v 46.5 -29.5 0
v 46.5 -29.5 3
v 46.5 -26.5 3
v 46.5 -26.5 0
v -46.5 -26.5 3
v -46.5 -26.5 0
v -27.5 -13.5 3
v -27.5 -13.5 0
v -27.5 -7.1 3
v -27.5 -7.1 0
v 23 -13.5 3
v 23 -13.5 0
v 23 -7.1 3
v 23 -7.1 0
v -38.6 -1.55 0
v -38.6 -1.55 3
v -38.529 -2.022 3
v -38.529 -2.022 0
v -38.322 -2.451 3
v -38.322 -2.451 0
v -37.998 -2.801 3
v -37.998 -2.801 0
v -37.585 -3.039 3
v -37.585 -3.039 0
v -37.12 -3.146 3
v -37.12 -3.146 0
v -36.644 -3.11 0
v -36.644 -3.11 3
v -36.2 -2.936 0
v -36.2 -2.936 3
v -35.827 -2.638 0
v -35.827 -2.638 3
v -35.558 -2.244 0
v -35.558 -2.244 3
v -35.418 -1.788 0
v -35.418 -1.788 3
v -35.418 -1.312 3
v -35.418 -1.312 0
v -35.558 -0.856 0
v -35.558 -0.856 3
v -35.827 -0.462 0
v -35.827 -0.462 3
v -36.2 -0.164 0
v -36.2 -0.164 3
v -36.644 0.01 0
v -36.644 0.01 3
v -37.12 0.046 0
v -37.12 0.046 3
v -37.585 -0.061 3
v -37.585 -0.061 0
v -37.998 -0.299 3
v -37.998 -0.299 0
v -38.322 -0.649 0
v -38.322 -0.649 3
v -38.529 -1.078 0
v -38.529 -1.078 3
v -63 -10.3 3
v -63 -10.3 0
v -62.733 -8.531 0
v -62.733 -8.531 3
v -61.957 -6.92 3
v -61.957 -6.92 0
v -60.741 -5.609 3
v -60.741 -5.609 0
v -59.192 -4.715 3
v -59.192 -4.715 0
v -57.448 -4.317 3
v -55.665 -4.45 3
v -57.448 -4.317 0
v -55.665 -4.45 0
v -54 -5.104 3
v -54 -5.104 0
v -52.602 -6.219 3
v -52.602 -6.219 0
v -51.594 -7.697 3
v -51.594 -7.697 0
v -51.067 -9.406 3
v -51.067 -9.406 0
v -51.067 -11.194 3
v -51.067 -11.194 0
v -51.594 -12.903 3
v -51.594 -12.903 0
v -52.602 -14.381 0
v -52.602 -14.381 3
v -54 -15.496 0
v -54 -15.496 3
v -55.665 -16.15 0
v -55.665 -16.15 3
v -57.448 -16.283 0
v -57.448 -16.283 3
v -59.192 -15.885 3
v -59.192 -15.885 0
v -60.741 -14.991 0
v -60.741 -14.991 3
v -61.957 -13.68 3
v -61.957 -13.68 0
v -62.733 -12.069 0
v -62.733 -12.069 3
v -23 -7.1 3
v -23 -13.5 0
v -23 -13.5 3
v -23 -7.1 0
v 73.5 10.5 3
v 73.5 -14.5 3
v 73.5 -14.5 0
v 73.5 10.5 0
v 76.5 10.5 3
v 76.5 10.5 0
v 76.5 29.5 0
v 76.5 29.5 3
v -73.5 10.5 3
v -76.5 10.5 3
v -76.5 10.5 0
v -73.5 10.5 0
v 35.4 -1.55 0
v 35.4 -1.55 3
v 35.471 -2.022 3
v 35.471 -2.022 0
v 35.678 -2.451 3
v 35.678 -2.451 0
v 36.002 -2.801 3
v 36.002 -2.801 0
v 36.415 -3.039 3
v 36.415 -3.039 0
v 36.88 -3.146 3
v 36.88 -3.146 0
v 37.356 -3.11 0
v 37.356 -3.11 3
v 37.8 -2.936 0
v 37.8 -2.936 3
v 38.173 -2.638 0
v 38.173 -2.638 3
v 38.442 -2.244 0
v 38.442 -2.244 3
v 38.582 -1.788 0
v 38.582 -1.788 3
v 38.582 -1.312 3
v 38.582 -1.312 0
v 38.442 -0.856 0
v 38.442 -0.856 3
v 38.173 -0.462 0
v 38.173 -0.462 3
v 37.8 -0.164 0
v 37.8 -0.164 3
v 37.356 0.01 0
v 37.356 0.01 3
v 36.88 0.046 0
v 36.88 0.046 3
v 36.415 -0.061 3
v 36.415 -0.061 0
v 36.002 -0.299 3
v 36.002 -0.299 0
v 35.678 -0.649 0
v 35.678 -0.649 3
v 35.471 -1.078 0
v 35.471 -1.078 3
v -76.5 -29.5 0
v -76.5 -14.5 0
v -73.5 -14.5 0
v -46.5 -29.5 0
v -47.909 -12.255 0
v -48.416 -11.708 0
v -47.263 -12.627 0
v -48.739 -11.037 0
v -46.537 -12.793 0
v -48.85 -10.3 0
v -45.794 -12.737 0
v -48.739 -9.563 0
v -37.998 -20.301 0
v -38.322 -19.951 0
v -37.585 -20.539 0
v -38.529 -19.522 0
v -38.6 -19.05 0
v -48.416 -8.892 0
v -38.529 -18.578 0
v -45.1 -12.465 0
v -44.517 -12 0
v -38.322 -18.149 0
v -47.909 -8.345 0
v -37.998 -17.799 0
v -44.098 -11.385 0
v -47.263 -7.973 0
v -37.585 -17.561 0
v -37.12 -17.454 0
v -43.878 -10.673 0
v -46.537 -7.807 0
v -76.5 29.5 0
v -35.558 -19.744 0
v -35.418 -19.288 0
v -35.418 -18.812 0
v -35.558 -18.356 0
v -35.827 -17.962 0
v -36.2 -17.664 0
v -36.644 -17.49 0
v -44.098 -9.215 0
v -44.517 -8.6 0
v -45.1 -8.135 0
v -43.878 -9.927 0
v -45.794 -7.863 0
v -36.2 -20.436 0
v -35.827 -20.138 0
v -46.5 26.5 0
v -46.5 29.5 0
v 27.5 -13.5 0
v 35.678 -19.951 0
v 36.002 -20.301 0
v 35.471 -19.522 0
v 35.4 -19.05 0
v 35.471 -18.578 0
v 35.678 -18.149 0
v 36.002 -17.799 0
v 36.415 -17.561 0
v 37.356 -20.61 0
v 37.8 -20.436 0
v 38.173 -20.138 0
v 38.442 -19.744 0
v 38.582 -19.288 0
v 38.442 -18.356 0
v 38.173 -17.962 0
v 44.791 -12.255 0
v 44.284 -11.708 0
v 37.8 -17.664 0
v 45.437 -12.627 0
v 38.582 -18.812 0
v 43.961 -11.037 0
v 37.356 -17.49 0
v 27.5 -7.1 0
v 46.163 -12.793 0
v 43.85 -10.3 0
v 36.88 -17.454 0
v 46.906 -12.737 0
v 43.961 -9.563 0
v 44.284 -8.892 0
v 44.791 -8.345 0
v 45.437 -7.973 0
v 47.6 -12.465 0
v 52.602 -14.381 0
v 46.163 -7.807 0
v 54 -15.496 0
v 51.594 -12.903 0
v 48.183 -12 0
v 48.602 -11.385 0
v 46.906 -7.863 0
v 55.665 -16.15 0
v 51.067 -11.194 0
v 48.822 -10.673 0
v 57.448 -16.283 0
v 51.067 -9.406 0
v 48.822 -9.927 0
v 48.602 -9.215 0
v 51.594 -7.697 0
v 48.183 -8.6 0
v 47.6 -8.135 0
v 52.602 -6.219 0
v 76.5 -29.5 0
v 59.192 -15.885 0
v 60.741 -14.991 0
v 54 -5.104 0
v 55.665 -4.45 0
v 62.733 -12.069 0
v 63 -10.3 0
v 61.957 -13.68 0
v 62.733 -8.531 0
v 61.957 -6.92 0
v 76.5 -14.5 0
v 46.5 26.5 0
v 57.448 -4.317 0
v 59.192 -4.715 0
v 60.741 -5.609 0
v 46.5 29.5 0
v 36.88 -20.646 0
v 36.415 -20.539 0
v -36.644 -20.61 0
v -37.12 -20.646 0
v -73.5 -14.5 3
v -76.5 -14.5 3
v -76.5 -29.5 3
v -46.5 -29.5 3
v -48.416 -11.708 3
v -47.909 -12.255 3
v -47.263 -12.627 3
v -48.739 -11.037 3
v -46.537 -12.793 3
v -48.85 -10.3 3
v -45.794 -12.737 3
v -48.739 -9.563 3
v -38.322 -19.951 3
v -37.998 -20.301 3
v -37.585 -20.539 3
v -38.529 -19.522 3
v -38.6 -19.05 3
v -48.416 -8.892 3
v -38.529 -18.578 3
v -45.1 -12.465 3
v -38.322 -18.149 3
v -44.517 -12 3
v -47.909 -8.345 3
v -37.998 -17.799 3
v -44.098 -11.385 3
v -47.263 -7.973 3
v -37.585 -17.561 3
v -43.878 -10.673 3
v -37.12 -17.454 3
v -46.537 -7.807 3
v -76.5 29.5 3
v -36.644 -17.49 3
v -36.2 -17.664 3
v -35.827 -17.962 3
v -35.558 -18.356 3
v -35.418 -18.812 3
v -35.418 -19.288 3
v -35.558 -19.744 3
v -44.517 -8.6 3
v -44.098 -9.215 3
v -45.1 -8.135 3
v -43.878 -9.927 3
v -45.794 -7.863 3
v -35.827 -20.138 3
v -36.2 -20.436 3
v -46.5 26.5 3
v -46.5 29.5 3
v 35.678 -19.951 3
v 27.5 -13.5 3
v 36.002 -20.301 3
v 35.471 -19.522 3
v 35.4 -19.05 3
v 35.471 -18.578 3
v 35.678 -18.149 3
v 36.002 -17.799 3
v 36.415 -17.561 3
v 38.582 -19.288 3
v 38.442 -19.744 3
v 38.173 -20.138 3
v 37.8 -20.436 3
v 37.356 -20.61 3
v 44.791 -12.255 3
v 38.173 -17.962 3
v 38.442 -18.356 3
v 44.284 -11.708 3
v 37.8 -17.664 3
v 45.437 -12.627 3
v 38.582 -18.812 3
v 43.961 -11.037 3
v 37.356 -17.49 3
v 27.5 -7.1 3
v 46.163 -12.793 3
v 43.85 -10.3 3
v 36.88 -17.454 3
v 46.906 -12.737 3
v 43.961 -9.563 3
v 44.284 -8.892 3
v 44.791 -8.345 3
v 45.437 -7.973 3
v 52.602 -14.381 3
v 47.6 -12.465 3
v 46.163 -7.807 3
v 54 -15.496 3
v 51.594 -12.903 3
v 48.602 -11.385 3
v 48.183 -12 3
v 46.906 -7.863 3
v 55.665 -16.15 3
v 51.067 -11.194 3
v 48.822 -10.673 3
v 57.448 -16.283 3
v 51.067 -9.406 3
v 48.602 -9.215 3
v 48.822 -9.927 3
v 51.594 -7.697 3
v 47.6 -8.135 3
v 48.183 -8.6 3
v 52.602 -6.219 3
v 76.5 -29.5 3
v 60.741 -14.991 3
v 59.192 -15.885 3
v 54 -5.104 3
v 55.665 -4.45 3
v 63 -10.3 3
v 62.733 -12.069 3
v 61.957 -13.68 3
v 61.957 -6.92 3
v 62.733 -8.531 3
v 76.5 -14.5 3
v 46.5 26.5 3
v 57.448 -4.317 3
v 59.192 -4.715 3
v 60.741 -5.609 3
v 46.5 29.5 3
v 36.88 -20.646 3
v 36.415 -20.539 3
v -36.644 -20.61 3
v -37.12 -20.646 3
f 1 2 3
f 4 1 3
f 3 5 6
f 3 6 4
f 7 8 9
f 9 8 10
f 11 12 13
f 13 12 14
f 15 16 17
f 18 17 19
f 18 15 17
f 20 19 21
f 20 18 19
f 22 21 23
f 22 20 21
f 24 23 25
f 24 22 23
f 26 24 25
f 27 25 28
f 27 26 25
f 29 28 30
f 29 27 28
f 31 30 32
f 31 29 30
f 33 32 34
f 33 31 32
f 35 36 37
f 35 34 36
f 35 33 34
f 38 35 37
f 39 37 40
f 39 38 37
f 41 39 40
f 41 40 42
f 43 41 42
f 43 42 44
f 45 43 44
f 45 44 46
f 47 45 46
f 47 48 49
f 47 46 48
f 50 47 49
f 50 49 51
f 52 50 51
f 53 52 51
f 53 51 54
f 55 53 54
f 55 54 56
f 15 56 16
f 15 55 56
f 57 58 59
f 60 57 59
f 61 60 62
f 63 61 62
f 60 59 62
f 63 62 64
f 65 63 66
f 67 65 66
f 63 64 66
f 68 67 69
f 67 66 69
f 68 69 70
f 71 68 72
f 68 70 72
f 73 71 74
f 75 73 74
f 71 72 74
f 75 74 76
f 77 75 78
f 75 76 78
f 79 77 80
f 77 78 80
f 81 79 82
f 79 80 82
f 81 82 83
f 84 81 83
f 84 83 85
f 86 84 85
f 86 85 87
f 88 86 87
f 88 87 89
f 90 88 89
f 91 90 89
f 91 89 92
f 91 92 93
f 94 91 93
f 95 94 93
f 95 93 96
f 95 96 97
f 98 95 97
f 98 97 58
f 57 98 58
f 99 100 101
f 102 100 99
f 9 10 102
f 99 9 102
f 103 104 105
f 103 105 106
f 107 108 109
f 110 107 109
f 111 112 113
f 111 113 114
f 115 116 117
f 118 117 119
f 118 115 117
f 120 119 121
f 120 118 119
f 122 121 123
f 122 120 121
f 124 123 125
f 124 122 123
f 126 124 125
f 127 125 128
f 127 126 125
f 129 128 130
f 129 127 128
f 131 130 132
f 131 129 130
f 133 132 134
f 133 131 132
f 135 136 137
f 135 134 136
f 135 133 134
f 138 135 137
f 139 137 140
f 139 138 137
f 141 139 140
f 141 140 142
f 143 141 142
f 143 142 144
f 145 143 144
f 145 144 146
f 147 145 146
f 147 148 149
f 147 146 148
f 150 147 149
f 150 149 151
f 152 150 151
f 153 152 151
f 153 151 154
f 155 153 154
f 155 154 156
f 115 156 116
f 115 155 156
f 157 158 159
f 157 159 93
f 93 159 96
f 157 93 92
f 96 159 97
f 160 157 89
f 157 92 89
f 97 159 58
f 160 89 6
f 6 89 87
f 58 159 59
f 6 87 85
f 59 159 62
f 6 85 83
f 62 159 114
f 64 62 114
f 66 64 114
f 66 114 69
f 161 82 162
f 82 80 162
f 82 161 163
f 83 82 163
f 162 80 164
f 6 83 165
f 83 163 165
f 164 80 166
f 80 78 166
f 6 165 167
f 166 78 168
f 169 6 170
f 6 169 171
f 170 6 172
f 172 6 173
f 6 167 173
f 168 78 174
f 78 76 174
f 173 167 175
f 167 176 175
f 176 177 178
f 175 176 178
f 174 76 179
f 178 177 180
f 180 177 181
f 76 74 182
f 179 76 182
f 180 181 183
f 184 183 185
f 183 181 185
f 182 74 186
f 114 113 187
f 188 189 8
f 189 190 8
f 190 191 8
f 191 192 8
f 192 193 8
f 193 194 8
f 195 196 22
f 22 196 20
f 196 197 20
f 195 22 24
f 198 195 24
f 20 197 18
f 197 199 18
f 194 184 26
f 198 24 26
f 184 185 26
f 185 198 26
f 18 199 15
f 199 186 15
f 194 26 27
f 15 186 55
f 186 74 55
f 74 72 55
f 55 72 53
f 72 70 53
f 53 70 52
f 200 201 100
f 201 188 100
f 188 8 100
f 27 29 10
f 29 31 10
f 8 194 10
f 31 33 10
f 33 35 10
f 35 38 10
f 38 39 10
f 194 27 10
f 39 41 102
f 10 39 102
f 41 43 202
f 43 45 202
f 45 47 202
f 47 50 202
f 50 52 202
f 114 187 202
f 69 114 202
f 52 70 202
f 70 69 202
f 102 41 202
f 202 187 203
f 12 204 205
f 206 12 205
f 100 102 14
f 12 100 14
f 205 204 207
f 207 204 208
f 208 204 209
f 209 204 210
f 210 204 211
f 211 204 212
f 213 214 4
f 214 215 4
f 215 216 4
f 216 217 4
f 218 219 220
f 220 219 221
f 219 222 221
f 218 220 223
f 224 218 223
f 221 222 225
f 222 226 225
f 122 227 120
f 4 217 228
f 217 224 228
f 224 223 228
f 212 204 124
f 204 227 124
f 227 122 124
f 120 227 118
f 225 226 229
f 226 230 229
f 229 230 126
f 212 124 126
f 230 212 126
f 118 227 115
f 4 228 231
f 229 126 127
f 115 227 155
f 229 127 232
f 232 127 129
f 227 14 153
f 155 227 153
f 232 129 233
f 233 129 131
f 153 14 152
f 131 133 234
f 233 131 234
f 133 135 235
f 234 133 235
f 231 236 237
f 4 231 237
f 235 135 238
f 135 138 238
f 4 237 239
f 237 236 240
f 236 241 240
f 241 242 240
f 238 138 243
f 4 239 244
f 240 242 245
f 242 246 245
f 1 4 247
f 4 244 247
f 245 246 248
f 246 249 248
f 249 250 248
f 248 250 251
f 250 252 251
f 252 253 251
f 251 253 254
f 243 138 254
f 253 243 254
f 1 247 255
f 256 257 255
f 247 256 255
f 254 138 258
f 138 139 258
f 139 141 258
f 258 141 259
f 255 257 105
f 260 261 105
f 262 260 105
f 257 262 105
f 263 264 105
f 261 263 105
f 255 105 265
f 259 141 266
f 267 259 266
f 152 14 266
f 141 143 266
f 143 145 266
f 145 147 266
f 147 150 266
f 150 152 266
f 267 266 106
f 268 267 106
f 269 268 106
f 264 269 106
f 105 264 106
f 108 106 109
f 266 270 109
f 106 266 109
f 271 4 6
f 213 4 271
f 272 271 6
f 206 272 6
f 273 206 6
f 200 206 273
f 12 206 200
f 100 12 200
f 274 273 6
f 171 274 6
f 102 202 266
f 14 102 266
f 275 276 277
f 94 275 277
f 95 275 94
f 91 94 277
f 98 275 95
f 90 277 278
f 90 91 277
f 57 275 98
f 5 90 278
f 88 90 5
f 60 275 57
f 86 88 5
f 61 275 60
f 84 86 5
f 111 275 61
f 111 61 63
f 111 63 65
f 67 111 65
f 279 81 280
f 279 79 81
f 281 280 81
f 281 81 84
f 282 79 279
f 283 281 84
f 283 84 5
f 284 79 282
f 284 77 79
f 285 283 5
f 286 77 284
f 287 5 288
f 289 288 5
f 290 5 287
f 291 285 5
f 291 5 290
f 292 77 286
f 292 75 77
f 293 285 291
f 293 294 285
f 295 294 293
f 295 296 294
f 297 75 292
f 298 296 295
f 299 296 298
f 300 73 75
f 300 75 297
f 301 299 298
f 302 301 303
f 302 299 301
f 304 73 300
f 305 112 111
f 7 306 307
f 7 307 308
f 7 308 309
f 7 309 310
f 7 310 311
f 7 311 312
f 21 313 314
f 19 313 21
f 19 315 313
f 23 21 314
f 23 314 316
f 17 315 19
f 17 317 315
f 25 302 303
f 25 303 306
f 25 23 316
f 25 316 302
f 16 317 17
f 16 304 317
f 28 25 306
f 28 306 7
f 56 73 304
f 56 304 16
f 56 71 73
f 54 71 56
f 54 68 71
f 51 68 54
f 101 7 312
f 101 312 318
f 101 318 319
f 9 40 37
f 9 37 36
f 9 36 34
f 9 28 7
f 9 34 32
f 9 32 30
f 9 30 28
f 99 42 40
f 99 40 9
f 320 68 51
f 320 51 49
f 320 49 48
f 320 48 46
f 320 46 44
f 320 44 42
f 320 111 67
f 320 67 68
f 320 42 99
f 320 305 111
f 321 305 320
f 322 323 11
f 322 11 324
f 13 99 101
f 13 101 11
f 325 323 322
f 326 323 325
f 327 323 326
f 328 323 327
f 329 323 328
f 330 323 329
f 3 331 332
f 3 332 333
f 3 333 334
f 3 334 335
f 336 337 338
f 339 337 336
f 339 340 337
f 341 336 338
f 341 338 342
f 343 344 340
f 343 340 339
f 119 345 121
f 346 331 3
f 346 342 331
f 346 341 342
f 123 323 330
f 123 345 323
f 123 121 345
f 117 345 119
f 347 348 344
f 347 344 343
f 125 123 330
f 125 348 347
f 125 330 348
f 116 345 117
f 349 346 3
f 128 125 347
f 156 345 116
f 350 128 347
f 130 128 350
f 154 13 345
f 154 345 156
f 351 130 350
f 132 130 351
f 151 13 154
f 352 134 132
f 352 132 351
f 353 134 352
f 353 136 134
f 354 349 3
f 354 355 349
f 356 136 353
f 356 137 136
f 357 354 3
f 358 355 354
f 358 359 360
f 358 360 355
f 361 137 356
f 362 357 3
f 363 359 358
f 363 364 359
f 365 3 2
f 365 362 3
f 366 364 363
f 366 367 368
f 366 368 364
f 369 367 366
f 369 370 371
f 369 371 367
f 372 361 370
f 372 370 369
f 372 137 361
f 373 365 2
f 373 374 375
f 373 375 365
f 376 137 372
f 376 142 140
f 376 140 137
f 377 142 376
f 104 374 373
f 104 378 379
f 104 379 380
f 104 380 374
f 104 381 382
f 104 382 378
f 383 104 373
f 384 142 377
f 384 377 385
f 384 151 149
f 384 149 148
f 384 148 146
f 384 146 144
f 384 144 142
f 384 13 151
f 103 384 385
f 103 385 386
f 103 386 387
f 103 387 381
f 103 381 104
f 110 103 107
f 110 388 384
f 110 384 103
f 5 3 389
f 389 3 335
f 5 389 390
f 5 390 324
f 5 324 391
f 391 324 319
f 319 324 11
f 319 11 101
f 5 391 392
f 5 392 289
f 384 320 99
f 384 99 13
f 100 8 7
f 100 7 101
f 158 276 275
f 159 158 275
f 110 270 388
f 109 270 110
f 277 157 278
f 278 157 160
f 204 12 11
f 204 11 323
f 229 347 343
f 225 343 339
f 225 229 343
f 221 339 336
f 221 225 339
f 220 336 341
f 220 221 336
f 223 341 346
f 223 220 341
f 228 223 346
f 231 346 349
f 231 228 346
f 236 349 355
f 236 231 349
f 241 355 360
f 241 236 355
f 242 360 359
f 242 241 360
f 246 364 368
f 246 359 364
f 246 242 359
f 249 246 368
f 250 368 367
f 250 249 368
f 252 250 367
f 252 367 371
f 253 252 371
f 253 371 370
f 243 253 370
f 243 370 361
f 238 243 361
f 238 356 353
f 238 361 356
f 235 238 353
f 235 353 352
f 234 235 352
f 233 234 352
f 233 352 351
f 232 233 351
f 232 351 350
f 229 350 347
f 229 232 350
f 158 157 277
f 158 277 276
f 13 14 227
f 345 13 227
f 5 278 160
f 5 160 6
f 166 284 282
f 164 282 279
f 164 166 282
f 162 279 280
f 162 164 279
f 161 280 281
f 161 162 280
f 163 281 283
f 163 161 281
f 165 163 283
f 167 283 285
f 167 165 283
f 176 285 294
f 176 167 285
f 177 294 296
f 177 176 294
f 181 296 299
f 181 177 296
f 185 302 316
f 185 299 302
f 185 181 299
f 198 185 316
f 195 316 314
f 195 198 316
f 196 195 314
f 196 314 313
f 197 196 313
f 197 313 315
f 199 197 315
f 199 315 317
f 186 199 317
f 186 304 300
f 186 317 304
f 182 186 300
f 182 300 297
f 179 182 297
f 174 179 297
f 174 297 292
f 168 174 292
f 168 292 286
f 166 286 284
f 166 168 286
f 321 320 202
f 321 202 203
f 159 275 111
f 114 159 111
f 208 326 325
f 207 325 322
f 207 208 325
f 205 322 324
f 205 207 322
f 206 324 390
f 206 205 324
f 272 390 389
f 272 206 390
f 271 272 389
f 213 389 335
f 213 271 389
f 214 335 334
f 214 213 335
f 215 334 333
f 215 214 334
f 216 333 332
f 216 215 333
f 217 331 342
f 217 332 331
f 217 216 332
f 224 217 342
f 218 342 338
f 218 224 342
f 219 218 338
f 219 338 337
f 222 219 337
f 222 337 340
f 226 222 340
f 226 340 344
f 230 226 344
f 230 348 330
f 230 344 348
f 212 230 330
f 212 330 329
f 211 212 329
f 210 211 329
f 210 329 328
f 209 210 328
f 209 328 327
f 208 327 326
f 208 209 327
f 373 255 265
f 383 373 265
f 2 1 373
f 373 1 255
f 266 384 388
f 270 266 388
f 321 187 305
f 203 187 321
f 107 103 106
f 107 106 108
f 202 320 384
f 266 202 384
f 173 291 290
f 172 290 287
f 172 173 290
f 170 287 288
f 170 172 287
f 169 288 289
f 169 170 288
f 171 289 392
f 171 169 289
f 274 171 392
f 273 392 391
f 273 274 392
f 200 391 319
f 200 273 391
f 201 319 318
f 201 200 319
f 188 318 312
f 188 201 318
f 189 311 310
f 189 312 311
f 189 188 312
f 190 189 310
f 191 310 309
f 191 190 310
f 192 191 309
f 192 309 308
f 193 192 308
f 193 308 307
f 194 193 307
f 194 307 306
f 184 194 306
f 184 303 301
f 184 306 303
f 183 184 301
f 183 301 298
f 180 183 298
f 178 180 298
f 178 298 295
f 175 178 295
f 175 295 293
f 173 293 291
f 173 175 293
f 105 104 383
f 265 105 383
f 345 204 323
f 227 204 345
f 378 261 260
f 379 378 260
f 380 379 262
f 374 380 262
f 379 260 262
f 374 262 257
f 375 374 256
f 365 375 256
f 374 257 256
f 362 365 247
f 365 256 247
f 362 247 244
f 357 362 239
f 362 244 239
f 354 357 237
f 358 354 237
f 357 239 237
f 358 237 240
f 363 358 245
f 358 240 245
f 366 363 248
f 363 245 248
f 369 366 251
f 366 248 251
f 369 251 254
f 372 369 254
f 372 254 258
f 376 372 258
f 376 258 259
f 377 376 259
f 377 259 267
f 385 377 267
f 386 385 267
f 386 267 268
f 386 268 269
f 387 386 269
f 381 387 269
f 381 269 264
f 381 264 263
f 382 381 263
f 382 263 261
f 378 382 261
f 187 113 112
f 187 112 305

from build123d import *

# Parameters (mm, degrees)
ESBO_O1_W                = 153
ESBO_O1_H                = 59
RESSALTO_EXTRUS_O1_DEPTH = 3
ESBO_O2_W                = 93
ESBO_O2_H                = 3
CORTE_EXTRUS_O1_DEPTH    = 83.045718962
ESBO_O3_W                = 3
ESBO_O3_H                = 25
CORTE_EXTRUS_O2_DEPTH    = 83.045718962
ESBO_O4_R                = 6
CORTE_EXTRUS_O3_DEPTH    = 83.045718962
ESBO_O5_R                = 1.6
ESBO_O5_R_2              = 2.5
ESBO_O5_W                = 4.5
ESBO_O5_H                = 6.4
CORTE_EXTRUS_O4_DEPTH    = 83.045718962


with BuildPart() as part:
    # Esboço1 → Ressalto-extrusão1 (new body)
    with BuildSketch(Plane.XY):
        Rectangle(ESBO_O1_W, ESBO_O1_H)
    extrude(amount=RESSALTO_EXTRUS_O1_DEPTH)

    # Esboço2 → Corte-extrusão1 (cut, through all)
    with BuildSketch(Plane.XY.offset(3)):
        with Locations((0, 28)):
            Rectangle(ESBO_O2_W, ESBO_O2_H)
        with Locations((0, -28)):
            Rectangle(ESBO_O2_W, ESBO_O2_H)
    extrude(amount=-CORTE_EXTRUS_O1_DEPTH, mode=Mode.SUBTRACT)

    # Esboço3 → Corte-extrusão2 (cut, through all)
    with BuildSketch(Plane.XY.offset(3)):
        with Locations((-75, -2)):
            Rectangle(ESBO_O3_W, ESBO_O3_H)
        with Locations((75, -2)):
            Rectangle(ESBO_O3_W, ESBO_O3_H)
    extrude(amount=-CORTE_EXTRUS_O2_DEPTH, mode=Mode.SUBTRACT)

    # Esboço4 → Corte-extrusão3 (cut, through all)
    with BuildSketch(Plane(origin=(0, 0, 0), x_dir=(-1, 0, 0), z_dir=(0, 0, -1))):
        with Locations((57, -10.3)):
            Circle(ESBO_O4_R)
        with Locations(Location((-57, -10.3, 0), (0, 0, 180))):
            Circle(ESBO_O4_R)
    extrude(amount=-CORTE_EXTRUS_O3_DEPTH, mode=Mode.SUBTRACT)

    # Esboço5 → Corte-extrusão4 (cut, through all)
    with BuildSketch(Plane.XY):
        with Locations(Location((-37, -1.55, 0), (0, 0, 180))):
            Circle(ESBO_O5_R)
        with Locations(Location((-37, -19.05, 0), (0, 0, 180))):
            Circle(ESBO_O5_R)
        with Locations(Location((37, -19.05, 0), (0, 0, 180))):
            Circle(ESBO_O5_R)
        with Locations(Location((37, -1.55, 0), (0, 0, 180))):
            Circle(ESBO_O5_R)
        with Locations(Location((-46.35, -10.3, 0), (0, 0, 180))):
            Circle(ESBO_O5_R_2)
        with Locations(Location((46.35, -10.3, 0), (0, 0, 180))):
            Circle(ESBO_O5_R_2)
        with Locations((25.25, -10.3)):
            Rectangle(ESBO_O5_W, ESBO_O5_H)
        with Locations((-25.25, -10.3)):
            Rectangle(ESBO_O5_W, ESBO_O5_H)
    extrude(amount=CORTE_EXTRUS_O4_DEPTH, mode=Mode.SUBTRACT)


solid = part.part
